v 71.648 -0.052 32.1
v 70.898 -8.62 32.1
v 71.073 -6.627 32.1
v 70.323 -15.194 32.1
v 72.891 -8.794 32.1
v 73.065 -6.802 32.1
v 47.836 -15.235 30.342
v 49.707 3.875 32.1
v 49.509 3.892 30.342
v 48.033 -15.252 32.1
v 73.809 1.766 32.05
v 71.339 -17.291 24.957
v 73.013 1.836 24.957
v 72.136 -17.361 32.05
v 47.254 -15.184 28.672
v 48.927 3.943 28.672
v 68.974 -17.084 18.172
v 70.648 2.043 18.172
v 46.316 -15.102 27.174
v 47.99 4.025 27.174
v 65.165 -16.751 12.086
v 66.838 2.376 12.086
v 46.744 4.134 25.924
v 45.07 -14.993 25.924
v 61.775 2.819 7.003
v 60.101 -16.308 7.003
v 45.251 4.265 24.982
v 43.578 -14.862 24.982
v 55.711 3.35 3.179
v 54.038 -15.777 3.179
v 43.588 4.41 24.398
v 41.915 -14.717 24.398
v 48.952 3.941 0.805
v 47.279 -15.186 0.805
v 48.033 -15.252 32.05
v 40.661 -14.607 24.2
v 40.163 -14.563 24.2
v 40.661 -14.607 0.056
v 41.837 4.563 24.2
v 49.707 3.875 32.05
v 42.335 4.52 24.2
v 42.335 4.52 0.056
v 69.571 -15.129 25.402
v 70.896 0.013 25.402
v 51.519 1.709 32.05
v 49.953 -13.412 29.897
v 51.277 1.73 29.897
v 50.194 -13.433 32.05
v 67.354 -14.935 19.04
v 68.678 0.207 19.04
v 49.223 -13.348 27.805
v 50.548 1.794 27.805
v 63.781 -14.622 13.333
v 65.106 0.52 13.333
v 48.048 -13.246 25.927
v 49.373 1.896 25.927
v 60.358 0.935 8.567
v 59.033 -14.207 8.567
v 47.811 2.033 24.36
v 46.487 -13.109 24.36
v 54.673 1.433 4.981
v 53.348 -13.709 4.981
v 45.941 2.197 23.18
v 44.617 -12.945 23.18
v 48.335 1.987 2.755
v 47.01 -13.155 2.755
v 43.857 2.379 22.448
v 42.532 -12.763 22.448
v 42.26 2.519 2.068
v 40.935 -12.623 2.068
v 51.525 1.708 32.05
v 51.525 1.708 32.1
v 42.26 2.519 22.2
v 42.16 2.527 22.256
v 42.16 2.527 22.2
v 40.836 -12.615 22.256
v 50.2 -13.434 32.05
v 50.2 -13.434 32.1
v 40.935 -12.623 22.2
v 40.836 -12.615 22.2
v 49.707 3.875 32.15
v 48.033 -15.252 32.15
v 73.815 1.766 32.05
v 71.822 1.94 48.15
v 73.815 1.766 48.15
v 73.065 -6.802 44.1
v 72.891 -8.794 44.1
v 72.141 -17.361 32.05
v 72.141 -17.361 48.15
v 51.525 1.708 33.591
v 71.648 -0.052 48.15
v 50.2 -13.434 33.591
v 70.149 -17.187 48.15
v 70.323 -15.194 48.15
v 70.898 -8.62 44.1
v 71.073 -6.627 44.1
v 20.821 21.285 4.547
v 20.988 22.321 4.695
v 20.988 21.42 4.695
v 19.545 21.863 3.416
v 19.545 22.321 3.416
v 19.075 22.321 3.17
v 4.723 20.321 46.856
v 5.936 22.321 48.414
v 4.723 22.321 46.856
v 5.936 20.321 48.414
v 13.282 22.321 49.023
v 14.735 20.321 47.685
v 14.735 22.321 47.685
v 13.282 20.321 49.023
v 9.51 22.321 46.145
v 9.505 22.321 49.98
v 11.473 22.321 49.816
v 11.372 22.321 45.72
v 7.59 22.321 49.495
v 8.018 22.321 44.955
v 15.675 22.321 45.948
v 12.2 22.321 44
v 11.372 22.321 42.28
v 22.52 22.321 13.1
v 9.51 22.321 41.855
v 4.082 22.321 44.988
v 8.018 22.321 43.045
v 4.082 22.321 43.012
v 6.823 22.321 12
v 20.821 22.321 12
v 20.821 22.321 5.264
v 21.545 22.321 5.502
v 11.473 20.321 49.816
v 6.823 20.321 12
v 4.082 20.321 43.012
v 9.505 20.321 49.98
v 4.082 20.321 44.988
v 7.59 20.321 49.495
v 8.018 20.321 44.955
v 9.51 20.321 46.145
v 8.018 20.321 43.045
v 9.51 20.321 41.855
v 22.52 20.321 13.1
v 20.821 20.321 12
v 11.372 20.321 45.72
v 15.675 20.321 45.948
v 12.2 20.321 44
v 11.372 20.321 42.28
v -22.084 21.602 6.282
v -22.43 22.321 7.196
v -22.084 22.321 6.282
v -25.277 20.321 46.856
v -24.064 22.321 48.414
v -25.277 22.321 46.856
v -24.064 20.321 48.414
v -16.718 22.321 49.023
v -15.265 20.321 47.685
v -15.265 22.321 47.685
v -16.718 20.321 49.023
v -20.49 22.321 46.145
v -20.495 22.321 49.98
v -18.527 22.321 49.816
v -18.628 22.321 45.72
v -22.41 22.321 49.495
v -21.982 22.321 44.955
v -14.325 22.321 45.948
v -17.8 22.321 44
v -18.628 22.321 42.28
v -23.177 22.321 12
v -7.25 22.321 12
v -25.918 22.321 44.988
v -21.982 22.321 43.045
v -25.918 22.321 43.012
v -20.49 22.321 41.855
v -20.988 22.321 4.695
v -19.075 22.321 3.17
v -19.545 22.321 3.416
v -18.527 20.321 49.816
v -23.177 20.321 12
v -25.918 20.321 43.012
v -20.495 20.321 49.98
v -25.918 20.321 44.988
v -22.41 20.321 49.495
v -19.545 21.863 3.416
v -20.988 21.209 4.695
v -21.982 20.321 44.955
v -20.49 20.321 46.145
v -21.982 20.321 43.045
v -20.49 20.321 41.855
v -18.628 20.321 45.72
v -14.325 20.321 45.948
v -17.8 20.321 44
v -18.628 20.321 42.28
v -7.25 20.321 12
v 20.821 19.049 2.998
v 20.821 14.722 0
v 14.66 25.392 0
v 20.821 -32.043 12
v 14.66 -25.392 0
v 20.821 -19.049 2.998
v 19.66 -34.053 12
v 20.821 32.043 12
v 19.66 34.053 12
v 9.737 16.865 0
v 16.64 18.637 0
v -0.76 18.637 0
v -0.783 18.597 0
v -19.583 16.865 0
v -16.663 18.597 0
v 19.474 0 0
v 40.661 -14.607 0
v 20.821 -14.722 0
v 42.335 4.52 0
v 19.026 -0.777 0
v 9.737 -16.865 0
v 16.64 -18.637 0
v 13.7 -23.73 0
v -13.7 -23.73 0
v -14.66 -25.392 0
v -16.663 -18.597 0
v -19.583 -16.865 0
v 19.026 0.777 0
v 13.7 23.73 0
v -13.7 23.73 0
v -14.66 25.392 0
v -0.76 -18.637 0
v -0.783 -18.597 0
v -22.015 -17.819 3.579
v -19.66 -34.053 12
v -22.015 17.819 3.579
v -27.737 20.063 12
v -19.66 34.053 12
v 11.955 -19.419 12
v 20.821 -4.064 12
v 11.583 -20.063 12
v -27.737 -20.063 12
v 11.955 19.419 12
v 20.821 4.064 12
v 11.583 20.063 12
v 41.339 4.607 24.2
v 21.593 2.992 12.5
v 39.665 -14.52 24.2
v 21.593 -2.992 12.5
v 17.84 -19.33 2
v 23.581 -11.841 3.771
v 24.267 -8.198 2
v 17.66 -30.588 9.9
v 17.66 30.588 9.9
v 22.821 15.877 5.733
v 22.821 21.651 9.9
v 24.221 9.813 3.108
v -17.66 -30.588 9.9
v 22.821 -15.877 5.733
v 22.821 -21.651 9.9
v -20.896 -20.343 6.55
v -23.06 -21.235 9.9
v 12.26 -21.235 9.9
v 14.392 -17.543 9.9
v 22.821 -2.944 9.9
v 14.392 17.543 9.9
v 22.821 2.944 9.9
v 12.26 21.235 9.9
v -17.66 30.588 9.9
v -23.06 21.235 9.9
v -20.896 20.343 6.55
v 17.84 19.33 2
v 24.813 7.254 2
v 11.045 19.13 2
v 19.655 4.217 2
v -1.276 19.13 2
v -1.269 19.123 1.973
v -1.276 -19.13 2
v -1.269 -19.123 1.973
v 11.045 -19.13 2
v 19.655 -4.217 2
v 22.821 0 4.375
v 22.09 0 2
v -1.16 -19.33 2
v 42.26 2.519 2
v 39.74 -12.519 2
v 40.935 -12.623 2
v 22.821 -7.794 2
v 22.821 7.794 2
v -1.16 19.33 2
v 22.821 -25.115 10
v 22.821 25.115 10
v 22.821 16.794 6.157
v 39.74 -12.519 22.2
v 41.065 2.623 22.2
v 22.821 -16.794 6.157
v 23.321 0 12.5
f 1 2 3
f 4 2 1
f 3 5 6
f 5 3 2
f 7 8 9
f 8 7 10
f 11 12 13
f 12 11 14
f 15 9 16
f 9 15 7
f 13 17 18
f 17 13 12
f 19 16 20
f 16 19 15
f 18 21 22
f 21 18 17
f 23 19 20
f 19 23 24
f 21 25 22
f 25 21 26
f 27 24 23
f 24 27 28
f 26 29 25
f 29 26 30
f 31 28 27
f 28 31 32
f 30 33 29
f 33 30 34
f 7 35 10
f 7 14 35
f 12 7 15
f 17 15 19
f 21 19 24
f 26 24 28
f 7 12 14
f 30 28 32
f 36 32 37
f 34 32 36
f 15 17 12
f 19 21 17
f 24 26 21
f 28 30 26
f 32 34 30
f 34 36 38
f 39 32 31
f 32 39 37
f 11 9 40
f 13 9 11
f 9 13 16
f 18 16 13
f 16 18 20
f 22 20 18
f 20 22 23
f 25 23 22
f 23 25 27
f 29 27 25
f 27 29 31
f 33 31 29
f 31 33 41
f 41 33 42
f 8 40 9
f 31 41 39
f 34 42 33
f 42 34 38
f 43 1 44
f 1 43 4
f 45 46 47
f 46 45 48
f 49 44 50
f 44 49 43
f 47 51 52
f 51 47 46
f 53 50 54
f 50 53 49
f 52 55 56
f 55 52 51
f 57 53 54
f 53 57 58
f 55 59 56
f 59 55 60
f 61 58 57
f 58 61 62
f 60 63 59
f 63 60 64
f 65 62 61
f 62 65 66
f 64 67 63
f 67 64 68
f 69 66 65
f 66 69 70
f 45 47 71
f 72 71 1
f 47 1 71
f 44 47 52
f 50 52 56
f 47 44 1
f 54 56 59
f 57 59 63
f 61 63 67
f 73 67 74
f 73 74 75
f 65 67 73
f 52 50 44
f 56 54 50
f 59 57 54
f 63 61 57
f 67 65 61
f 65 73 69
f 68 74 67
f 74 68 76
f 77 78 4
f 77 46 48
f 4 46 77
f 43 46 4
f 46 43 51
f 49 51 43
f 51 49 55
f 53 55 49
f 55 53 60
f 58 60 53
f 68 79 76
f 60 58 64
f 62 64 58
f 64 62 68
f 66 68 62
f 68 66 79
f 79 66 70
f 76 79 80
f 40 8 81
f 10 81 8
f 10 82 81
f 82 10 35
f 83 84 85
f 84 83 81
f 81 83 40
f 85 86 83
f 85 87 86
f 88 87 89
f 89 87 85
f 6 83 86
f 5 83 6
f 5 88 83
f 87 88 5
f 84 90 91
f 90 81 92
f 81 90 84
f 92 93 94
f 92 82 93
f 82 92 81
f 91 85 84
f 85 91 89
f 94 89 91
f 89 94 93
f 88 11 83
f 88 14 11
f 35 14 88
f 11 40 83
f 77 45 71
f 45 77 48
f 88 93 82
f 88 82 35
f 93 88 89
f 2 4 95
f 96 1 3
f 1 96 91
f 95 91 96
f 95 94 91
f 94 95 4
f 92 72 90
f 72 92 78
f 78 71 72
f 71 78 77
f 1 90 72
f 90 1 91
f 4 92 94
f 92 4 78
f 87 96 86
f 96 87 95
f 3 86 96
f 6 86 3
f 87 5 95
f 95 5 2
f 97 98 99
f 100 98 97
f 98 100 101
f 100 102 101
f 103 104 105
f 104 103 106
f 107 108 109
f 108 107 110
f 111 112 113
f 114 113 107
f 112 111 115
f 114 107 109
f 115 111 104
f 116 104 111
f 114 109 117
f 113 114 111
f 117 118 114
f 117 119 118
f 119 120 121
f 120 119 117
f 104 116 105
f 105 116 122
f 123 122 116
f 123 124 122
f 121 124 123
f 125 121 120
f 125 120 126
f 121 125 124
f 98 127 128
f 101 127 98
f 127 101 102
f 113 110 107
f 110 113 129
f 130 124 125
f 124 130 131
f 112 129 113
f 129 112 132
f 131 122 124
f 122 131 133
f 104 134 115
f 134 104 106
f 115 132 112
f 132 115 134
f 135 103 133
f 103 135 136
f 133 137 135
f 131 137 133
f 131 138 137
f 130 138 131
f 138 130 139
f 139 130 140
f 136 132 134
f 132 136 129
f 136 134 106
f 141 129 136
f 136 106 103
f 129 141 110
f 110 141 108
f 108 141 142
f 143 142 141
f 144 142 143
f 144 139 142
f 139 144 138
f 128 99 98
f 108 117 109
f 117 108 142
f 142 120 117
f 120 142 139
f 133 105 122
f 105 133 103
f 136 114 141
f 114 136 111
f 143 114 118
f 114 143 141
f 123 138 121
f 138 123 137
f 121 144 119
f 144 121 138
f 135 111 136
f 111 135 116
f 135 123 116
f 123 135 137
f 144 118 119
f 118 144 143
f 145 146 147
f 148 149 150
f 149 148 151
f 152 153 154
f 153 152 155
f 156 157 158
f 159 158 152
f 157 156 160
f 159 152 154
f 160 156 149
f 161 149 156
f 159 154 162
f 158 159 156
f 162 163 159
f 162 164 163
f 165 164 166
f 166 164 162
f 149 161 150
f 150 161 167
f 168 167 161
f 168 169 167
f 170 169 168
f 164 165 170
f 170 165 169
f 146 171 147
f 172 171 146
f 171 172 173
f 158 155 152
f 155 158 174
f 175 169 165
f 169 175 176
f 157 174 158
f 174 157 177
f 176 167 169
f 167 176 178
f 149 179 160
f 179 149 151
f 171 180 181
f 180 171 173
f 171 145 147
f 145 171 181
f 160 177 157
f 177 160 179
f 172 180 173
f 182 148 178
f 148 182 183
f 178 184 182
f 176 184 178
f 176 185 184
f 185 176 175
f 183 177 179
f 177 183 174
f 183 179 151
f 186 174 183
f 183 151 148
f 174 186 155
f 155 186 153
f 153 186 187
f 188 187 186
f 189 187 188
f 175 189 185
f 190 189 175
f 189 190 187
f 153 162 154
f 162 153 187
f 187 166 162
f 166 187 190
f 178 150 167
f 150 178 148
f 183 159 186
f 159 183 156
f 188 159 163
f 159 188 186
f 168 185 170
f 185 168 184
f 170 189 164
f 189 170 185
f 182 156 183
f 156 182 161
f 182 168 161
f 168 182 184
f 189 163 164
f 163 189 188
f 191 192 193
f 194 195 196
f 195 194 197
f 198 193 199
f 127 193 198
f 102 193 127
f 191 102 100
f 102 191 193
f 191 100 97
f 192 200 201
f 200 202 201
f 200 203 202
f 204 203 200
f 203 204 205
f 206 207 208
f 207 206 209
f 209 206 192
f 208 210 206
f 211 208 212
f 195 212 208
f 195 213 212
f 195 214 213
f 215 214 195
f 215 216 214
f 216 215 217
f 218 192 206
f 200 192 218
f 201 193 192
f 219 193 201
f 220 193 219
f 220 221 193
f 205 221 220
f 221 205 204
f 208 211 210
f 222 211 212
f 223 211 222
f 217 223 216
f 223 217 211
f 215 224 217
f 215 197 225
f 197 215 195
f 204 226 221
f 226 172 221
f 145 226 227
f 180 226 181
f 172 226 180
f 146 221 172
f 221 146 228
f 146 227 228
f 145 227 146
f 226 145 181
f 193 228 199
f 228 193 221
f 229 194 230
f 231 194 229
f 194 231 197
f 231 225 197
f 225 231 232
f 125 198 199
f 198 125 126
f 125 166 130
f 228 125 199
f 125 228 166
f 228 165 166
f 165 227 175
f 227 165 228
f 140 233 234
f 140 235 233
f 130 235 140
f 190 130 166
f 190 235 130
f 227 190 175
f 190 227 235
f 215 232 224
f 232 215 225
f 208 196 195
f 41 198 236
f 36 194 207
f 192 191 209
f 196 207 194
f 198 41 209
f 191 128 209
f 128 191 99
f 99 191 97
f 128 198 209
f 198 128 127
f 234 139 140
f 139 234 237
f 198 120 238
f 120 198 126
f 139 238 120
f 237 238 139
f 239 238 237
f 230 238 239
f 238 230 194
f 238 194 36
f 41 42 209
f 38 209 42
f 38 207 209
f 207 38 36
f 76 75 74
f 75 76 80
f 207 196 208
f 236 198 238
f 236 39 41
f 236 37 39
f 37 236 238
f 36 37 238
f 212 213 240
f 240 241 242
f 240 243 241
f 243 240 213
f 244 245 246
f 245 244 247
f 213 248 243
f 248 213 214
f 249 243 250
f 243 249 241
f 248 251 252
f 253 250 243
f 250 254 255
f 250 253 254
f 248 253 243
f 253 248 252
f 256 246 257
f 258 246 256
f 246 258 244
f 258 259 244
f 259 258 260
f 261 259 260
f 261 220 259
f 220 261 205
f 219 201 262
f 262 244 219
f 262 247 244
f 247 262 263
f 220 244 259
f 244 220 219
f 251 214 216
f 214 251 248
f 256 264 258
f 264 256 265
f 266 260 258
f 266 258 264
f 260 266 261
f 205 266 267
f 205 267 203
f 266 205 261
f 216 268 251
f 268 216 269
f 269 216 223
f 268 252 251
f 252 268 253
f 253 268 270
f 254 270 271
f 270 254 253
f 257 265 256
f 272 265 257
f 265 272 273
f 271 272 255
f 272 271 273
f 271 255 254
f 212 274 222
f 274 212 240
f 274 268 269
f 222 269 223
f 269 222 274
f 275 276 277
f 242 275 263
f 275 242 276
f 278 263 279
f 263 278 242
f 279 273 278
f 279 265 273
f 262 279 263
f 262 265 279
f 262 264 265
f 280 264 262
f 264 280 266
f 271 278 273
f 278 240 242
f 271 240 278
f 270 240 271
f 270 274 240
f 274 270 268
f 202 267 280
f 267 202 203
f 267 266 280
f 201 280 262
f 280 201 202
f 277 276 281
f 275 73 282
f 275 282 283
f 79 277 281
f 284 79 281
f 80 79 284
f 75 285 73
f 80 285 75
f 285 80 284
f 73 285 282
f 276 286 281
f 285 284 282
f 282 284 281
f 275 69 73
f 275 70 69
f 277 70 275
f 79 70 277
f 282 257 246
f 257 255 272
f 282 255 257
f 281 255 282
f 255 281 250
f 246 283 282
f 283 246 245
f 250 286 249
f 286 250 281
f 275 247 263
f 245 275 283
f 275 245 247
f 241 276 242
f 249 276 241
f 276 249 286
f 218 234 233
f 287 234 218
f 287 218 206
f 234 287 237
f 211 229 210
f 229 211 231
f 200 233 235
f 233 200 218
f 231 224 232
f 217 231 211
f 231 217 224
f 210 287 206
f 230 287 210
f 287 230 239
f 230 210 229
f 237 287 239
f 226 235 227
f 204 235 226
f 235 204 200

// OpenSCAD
hot_rad = 30/2/cos(30);
hotend_x=25;
fan_x = 15+5;

hotend_y=-5;

thickness = 10;
wall=2;
slop=.2;

fan_hole = (40-wall-wall)/2;
mount_drop = 10;
fan_z = fan_hole+wall;

//fan_mount();
//bowden_fan();
cyclops_fan();

%cylinder(r=hot_rad, h=20, center=true);
%translate([-23,0,0]) cylinder(r=hot_rad, h=20, center=true);

m3_cap_rad = 4;
m3_rad = 2;
m3_nut_rad = 6.01/2+.1;

facets = 6;

duct_angle=-5;
duct_jut = -5;

module fan_mount(){
    difference(){
        union(){
            //core
            cylinder(r1=hot_rad+thickness+wall, r2=hot_rad+thickness*2+wall, h=thickness+wall, $fn=facets);
            
            hull(){
                intersection(){
                    difference(){
                        cylinder(r1=hot_rad+thickness+wall, r2=hot_rad+thickness*2+wall, h=thickness+wall, $fn=facets);
                        translate([0,0,-.5]) cylinder(r1=hot_rad+wall, r2=hot_rad+wall+wall, h=thickness+wall+1, $fn=facets);
                    }
                    translate([50+hot_rad-6.7,50,50]) cube([100,100,100], center=true);
                }
                translate([hotend_x+fan_x-5,hotend_y,fan_z]) rotate([0,90,0]) cylinder(r=fan_hole+wall, h=5);
            }
            
            hull(){
                intersection(){
                    difference(){
                        cylinder(r1=hot_rad+thickness+wall, r2=hot_rad+thickness*2+wall, h=thickness+wall, $fn=facets);
                        translate([0,0,-.5]) cylinder(r1=hot_rad+wall, r2=hot_rad+wall+wall, h=thickness+wall+1, $fn=facets);
                    }
                    translate([50+hot_rad-6.7,-50,50]) cube([100,100,100], center=true);
                }
                translate([hotend_x+fan_x-5,hotend_y,fan_z]) rotate([0,90,0]) cylinder(r=fan_hole+wall, h=5);
            }
            
            //fan mount
            translate([hotend_x+fan_x,hotend_y,fan_z]) rotate([0,90,0]){
                hull() for(i=[0:90:359]) rotate([0,0,i]) {
                    #translate([20-wall,20-wall,-wall]) cylinder(r=wall,h=wall*2, $fn=16);
                }    
            }
            
            //mounting lugs above fan
            translate([hotend_x+fan_x,hotend_y,fan_z]) rotate([0,90,0]){
                for(i=[-16, 16]) difference(){
                    hull(){
                        translate([-16-mount_drop,i,-fan_x+3]) cylinder(r=m3_rad+wall, h=wall*2, $fn=16);
                        translate([0,i,-fan_x+3]) cylinder(r=m3_cap_rad*2, h=wall);
                    }
                    translate([-16-mount_drop,i,-fan_x+3-.1]) cylinder(r=m3_rad, h=wall*2+1, $fn=16);
                }
            }
        }
        
        //center cutout
        translate([0,0,-.5]) cylinder(r1=hot_rad+wall, r2=hot_rad+wall+wall, h=thickness+wall+1, $fn=facets);
                
        //front cutout
        translate([-(hot_rad+thickness*2+wall),0,0]) cylinder(r=hot_rad+thickness*2+wall, h=thickness+wall*10, center=true, $fn=facets);
        
        //fan holes
        translate([hotend_x+fan_x,hotend_y,fan_z]) rotate([0,90,0]){
            for(i=[-16, 16]) for(j=[-16, 16]) {
                #translate([j,i,-.1]) cylinder(r=m3_rad, h=wall+.2, $fn=16);
                translate([j,i,-wall*2-.1]) cylinder(r2=m3_nut_rad, r1=m3_nut_rad+.25, h=wall*2+.2, $fn=6);
            }
        }
        
        //air path
        translate([0,0,-.1]) difference(){
            union(){
                translate([-wall,0,0]) cylinder(r1=hot_rad+thickness, r2=hot_rad+thickness*2-wall, h=thickness, $fn=facets);
                
                hull(){
                    intersection(){
                        difference(){
                            translate([-wall,0,0]) cylinder(r1=hot_rad+thickness, r2=hot_rad+thickness*2-wall, h=thickness, $fn=facets);
                            translate([0,0,-.5]) cylinder(r1=hot_rad+wall*2, r2=hot_rad+wall*3, h=thickness+wall+1, $fn=facets);
                        }
                        translate([50+hot_rad-6.7,50,50]) cube([100,100,100], center=true);
                    }
                    translate([hotend_x+fan_x-5,hotend_y,fan_z]) rotate([0,90,0]) cylinder(r=fan_hole, h=.3);
                }
                
                hull(){
                    intersection(){
                        difference(){
                            translate([-wall,0,0]) cylinder(r1=hot_rad+thickness, r2=hot_rad+thickness*2-wall, h=thickness, $fn=facets);
                            translate([0,0,-.5]) cylinder(r1=hot_rad+wall+wall, r2=hot_rad+wall+wall+wall, h=thickness+wall+1, $fn=facets);
                        }
                        translate([50+hot_rad-6.7,-50,50]) cube([100,100,100], center=true);
                    }
                    translate([hotend_x+fan_x-5,hotend_y,fan_z]) rotate([0,90,0]) cylinder(r=fan_hole, h=.3);
                }
                
                translate([hotend_x+fan_x-5,hotend_y,fan_z]) rotate([0,90,0]) cylinder(r=fan_hole, h=wall+1+5);
            }
            cylinder(r1=hot_rad+wall+wall, r2=hot_rad+wall+wall+wall, h=thickness+wall, $fn=facets);
            translate([-(hot_rad+thickness*2),0,0]) cylinder(r=hot_rad+thickness*2+wall, h=thickness+wall*10, center=true, $fn=facets);
            translate([0,-5+hotend_y/2,0])cube([100,10,wall]);
        }
    }
}

module bowden_fan(){
    duct_w = 15+slop;
    duct_h = 20+slop;
    duct_offset=38;
    
    mount_height = 46;
    
    offset = -20;
    difference(){
        union(){
            //core
            hull(){
                cylinder(r1=hot_rad+thickness+wall, r2=hot_rad+thickness*2+wall, h=thickness+wall, $fn=facets);
                translate([offset,0,0]) cylinder(r1=hot_rad+thickness+wall, r2=hot_rad+thickness*2+wall, h=thickness+wall, $fn=facets);
            }
            
            //connection to duct
            hull(){
                intersection(){
                    cylinder(r1=hot_rad+thickness+wall, r2=hot_rad+thickness*2+wall, h=thickness+wall, $fn=facets);
                    translate([hot_rad+wall*2,0,0]) cube([1,200,200], center=true);
                }
                translate([duct_offset,duct_jut,duct_h/2+wall]) rotate([0,0,duct_angle]) cube([1,duct_w+wall*2, duct_h+wall*2], center=true);
            }
            
            //the duct connector
            translate([duct_offset,duct_jut,0]) rotate([0,0,duct_angle]) duct();
            
            //mounting lugs
           for(i=[10,-20,-40]) difference(){
                translate([i,hot_rad+wall*2,0]) hull(){
                    translate([5,0,thickness]) rotate([90,0,0]) cylinder(r=m3_cap_rad+wall*2, h=wall, center=true);
                    translate([0,0,mount_height]) rotate([90,0,0]) cylinder(r=m3_cap_rad+wall, h=wall, center=true);
                }
                
                //mounting holes up top
                translate([i,hot_rad+wall*2,mount_height]) rotate([90,0,0]) cylinder(r=m3_rad+slop, h=20, center=true);
            }
        }
        
        //connection to duct airflow
        hull(){
            intersection(){
                translate([0,0,wall]) cylinder(r1=hot_rad+thickness, r2=hot_rad+thickness*2, h=thickness-wall, $fn=facets);
                translate([hot_rad+wall*3,0,0]) cube([1,200,200], center=true);
            }
            translate([duct_offset,duct_jut,duct_h/2+wall]) rotate([0,0,duct_angle]) cube([1.2,duct_w, duct_h], center=true);
        }
        
        //center cutout
        translate([0,0,-.5]) hull(){
            cylinder(r1=hot_rad+wall, r2=hot_rad+wall*3, h=thickness+wall+1, $fn=facets);
            translate([2*offset,0,0]) cylinder(r1=hot_rad+wall, r2=hot_rad+wall*3, h=thickness+wall+1, $fn=facets);
        }
        
        //air path
        difference(){
            //core
            translate([0,0,-.1]) hull(){
                cylinder(r1=hot_rad+thickness, r2=hot_rad+thickness*2-wall, h=thickness, $fn=facets);
                translate([offset+wall,0,0]) cylinder(r1=hot_rad+thickness, r2=hot_rad+thickness*2-wall, h=thickness, $fn=facets);
            }
            
            //keep the center walls in place
            translate([0,0,-.5]) hull(){
                cylinder(r1=hot_rad+wall*2, r2=hot_rad+wall*4, h=thickness+wall+1, $fn=facets);
                translate([2*offset,0,0]) cylinder(r1=hot_rad+wall*2, r2=hot_rad+wall*4, h=thickness+wall+1, $fn=facets);
            }
            
            //bottom on the near side
            translate([10,0,-.5]) cylinder(r1=hot_rad+wall*2, r2=hot_rad+wall*2.5, h=wall+.5, $fn=facets);
        }
    }
}

module cyclops_fan(){
    duct_w = 15+slop;
    duct_h = 20+slop;
    duct_offset=38+3;
    
    mount_height = 46-2;
    
    offset = -20;
    difference(){
        union(){
            //core
            hull(){
                cylinder(r1=hot_rad+thickness+wall, r2=hot_rad+thickness*2+wall, h=thickness+wall, $fn=facets);
                //translate([offset,0,0]) cylinder(r1=hot_rad+thickness+wall, r2=hot_rad+thickness*2+wall, h=thickness+wall, $fn=facets);
            }
            
            //connection to duct
            hull(){
                intersection(){
                    cylinder(r1=hot_rad+thickness+wall, r2=hot_rad+thickness*2+wall, h=thickness+wall, $fn=facets);
                    translate([hot_rad+wall*2,0,0]) cube([1,200,200], center=true);
                }
                translate([duct_offset,duct_jut,duct_h/2+wall]) rotate([0,0,duct_angle]) cube([1,duct_w+wall*2, duct_h+wall*2], center=true);
            }
            
            //the duct connector
            translate([duct_offset,duct_jut,0]) rotate([0,0,duct_angle]) duct();
            
            //mounting lugs
           for(i=[10,-20]) difference(){
                translate([i,hot_rad+wall*2,0]) hull(){
                    translate([5,0,thickness]) rotate([90,0,0]) cylinder(r=m3_cap_rad+wall*2, h=wall, center=true);
                    translate([0,0,mount_height]) rotate([90,0,0]) cylinder(r=m3_cap_rad+wall, h=wall, center=true);
                }
                
                //mounting holes up top
                translate([i,hot_rad+wall*2,mount_height]) rotate([90,0,0]) cylinder(r=m3_rad+slop, h=20, center=true);
            }
        }
        
        //connection to duct airflow
        hull(){
            intersection(){
                translate([0,0,wall]) cylinder(r1=hot_rad+thickness, r2=hot_rad+thickness*2, h=thickness-wall, $fn=facets);
                translate([hot_rad+wall*3,0,0]) cube([1,200,200], center=true);
            }
            translate([duct_offset,duct_jut,duct_h/2+wall]) rotate([0,0,duct_angle]) cube([1.2,duct_w, duct_h], center=true);
        }
        
        //center cutout
        translate([0,0,-.5]) hull(){
            cylinder(r1=hot_rad+wall, r2=hot_rad+wall*3, h=thickness+wall+1, $fn=facets);
            translate([2*offset,0,0]) cylinder(r1=hot_rad+wall, r2=hot_rad+wall*3, h=thickness+wall+1, $fn=facets);
        }
        
        //air path
        difference(){
            //core
            translate([0,0,-.1]) hull(){
                cylinder(r1=hot_rad+thickness, r2=hot_rad+thickness*2-wall, h=thickness, $fn=facets);
                //translate([offset+wall,0,0]) cylinder(r1=hot_rad+thickness, r2=hot_rad+thickness*2-wall, h=thickness, $fn=facets);
            }
            
            //keep the center walls in place
            translate([0,0,-.5]) hull(){
                cylinder(r1=hot_rad+wall*2, r2=hot_rad+wall*4, h=thickness+wall+1, $fn=facets);
                translate([2*offset,0,0]) cylinder(r1=hot_rad+wall*2, r2=hot_rad+wall*4, h=thickness+wall+1, $fn=facets);
            }
            
            //bottom on the near side
            translate([10,0,-.5]) cylinder(r1=hot_rad+wall*2, r2=hot_rad+wall*2.5, h=wall+.5, $fn=facets);
        }
    }
}

module duct(){
    duct_w = 15+slop;
    duct_h = 20+slop;
    rad = 20;
    
    translate([0,0,rad+wall+duct_h/2]) rotate([-90,0,0]) union(){
        intersection(){
            rotate_extrude(angle = 90, convexity = 2){
                translate([rad,0,0])
                difference(){
                    square([duct_h+wall*2, duct_w+wall*2], center=true);
                    square([duct_h, duct_w], center=true);
                }
            }
            translate([0,0,-100]) cube([200,200,200]);
        }
        
        translate([rad,0,0]) rotate([90,0,0]) translate([0,0,8]) difference(){
            hull(){
                translate([0,0,-8]) cube([duct_h+wall*2,duct_w+wall*2,.1], center=true);
                #translate([duct_h/2+wall/2,0,8]) cube([wall,duct_w+wall*2,.1], center=true);
            }
            
            //hollow center
            cube([duct_h,duct_w,16.3], center=true);
            
            //slot for the clip
            translate([wall+1,0,(12-16)/2]) cube([duct_h+wall*2,2,12], center=true);
        }
        
    }
    
}
